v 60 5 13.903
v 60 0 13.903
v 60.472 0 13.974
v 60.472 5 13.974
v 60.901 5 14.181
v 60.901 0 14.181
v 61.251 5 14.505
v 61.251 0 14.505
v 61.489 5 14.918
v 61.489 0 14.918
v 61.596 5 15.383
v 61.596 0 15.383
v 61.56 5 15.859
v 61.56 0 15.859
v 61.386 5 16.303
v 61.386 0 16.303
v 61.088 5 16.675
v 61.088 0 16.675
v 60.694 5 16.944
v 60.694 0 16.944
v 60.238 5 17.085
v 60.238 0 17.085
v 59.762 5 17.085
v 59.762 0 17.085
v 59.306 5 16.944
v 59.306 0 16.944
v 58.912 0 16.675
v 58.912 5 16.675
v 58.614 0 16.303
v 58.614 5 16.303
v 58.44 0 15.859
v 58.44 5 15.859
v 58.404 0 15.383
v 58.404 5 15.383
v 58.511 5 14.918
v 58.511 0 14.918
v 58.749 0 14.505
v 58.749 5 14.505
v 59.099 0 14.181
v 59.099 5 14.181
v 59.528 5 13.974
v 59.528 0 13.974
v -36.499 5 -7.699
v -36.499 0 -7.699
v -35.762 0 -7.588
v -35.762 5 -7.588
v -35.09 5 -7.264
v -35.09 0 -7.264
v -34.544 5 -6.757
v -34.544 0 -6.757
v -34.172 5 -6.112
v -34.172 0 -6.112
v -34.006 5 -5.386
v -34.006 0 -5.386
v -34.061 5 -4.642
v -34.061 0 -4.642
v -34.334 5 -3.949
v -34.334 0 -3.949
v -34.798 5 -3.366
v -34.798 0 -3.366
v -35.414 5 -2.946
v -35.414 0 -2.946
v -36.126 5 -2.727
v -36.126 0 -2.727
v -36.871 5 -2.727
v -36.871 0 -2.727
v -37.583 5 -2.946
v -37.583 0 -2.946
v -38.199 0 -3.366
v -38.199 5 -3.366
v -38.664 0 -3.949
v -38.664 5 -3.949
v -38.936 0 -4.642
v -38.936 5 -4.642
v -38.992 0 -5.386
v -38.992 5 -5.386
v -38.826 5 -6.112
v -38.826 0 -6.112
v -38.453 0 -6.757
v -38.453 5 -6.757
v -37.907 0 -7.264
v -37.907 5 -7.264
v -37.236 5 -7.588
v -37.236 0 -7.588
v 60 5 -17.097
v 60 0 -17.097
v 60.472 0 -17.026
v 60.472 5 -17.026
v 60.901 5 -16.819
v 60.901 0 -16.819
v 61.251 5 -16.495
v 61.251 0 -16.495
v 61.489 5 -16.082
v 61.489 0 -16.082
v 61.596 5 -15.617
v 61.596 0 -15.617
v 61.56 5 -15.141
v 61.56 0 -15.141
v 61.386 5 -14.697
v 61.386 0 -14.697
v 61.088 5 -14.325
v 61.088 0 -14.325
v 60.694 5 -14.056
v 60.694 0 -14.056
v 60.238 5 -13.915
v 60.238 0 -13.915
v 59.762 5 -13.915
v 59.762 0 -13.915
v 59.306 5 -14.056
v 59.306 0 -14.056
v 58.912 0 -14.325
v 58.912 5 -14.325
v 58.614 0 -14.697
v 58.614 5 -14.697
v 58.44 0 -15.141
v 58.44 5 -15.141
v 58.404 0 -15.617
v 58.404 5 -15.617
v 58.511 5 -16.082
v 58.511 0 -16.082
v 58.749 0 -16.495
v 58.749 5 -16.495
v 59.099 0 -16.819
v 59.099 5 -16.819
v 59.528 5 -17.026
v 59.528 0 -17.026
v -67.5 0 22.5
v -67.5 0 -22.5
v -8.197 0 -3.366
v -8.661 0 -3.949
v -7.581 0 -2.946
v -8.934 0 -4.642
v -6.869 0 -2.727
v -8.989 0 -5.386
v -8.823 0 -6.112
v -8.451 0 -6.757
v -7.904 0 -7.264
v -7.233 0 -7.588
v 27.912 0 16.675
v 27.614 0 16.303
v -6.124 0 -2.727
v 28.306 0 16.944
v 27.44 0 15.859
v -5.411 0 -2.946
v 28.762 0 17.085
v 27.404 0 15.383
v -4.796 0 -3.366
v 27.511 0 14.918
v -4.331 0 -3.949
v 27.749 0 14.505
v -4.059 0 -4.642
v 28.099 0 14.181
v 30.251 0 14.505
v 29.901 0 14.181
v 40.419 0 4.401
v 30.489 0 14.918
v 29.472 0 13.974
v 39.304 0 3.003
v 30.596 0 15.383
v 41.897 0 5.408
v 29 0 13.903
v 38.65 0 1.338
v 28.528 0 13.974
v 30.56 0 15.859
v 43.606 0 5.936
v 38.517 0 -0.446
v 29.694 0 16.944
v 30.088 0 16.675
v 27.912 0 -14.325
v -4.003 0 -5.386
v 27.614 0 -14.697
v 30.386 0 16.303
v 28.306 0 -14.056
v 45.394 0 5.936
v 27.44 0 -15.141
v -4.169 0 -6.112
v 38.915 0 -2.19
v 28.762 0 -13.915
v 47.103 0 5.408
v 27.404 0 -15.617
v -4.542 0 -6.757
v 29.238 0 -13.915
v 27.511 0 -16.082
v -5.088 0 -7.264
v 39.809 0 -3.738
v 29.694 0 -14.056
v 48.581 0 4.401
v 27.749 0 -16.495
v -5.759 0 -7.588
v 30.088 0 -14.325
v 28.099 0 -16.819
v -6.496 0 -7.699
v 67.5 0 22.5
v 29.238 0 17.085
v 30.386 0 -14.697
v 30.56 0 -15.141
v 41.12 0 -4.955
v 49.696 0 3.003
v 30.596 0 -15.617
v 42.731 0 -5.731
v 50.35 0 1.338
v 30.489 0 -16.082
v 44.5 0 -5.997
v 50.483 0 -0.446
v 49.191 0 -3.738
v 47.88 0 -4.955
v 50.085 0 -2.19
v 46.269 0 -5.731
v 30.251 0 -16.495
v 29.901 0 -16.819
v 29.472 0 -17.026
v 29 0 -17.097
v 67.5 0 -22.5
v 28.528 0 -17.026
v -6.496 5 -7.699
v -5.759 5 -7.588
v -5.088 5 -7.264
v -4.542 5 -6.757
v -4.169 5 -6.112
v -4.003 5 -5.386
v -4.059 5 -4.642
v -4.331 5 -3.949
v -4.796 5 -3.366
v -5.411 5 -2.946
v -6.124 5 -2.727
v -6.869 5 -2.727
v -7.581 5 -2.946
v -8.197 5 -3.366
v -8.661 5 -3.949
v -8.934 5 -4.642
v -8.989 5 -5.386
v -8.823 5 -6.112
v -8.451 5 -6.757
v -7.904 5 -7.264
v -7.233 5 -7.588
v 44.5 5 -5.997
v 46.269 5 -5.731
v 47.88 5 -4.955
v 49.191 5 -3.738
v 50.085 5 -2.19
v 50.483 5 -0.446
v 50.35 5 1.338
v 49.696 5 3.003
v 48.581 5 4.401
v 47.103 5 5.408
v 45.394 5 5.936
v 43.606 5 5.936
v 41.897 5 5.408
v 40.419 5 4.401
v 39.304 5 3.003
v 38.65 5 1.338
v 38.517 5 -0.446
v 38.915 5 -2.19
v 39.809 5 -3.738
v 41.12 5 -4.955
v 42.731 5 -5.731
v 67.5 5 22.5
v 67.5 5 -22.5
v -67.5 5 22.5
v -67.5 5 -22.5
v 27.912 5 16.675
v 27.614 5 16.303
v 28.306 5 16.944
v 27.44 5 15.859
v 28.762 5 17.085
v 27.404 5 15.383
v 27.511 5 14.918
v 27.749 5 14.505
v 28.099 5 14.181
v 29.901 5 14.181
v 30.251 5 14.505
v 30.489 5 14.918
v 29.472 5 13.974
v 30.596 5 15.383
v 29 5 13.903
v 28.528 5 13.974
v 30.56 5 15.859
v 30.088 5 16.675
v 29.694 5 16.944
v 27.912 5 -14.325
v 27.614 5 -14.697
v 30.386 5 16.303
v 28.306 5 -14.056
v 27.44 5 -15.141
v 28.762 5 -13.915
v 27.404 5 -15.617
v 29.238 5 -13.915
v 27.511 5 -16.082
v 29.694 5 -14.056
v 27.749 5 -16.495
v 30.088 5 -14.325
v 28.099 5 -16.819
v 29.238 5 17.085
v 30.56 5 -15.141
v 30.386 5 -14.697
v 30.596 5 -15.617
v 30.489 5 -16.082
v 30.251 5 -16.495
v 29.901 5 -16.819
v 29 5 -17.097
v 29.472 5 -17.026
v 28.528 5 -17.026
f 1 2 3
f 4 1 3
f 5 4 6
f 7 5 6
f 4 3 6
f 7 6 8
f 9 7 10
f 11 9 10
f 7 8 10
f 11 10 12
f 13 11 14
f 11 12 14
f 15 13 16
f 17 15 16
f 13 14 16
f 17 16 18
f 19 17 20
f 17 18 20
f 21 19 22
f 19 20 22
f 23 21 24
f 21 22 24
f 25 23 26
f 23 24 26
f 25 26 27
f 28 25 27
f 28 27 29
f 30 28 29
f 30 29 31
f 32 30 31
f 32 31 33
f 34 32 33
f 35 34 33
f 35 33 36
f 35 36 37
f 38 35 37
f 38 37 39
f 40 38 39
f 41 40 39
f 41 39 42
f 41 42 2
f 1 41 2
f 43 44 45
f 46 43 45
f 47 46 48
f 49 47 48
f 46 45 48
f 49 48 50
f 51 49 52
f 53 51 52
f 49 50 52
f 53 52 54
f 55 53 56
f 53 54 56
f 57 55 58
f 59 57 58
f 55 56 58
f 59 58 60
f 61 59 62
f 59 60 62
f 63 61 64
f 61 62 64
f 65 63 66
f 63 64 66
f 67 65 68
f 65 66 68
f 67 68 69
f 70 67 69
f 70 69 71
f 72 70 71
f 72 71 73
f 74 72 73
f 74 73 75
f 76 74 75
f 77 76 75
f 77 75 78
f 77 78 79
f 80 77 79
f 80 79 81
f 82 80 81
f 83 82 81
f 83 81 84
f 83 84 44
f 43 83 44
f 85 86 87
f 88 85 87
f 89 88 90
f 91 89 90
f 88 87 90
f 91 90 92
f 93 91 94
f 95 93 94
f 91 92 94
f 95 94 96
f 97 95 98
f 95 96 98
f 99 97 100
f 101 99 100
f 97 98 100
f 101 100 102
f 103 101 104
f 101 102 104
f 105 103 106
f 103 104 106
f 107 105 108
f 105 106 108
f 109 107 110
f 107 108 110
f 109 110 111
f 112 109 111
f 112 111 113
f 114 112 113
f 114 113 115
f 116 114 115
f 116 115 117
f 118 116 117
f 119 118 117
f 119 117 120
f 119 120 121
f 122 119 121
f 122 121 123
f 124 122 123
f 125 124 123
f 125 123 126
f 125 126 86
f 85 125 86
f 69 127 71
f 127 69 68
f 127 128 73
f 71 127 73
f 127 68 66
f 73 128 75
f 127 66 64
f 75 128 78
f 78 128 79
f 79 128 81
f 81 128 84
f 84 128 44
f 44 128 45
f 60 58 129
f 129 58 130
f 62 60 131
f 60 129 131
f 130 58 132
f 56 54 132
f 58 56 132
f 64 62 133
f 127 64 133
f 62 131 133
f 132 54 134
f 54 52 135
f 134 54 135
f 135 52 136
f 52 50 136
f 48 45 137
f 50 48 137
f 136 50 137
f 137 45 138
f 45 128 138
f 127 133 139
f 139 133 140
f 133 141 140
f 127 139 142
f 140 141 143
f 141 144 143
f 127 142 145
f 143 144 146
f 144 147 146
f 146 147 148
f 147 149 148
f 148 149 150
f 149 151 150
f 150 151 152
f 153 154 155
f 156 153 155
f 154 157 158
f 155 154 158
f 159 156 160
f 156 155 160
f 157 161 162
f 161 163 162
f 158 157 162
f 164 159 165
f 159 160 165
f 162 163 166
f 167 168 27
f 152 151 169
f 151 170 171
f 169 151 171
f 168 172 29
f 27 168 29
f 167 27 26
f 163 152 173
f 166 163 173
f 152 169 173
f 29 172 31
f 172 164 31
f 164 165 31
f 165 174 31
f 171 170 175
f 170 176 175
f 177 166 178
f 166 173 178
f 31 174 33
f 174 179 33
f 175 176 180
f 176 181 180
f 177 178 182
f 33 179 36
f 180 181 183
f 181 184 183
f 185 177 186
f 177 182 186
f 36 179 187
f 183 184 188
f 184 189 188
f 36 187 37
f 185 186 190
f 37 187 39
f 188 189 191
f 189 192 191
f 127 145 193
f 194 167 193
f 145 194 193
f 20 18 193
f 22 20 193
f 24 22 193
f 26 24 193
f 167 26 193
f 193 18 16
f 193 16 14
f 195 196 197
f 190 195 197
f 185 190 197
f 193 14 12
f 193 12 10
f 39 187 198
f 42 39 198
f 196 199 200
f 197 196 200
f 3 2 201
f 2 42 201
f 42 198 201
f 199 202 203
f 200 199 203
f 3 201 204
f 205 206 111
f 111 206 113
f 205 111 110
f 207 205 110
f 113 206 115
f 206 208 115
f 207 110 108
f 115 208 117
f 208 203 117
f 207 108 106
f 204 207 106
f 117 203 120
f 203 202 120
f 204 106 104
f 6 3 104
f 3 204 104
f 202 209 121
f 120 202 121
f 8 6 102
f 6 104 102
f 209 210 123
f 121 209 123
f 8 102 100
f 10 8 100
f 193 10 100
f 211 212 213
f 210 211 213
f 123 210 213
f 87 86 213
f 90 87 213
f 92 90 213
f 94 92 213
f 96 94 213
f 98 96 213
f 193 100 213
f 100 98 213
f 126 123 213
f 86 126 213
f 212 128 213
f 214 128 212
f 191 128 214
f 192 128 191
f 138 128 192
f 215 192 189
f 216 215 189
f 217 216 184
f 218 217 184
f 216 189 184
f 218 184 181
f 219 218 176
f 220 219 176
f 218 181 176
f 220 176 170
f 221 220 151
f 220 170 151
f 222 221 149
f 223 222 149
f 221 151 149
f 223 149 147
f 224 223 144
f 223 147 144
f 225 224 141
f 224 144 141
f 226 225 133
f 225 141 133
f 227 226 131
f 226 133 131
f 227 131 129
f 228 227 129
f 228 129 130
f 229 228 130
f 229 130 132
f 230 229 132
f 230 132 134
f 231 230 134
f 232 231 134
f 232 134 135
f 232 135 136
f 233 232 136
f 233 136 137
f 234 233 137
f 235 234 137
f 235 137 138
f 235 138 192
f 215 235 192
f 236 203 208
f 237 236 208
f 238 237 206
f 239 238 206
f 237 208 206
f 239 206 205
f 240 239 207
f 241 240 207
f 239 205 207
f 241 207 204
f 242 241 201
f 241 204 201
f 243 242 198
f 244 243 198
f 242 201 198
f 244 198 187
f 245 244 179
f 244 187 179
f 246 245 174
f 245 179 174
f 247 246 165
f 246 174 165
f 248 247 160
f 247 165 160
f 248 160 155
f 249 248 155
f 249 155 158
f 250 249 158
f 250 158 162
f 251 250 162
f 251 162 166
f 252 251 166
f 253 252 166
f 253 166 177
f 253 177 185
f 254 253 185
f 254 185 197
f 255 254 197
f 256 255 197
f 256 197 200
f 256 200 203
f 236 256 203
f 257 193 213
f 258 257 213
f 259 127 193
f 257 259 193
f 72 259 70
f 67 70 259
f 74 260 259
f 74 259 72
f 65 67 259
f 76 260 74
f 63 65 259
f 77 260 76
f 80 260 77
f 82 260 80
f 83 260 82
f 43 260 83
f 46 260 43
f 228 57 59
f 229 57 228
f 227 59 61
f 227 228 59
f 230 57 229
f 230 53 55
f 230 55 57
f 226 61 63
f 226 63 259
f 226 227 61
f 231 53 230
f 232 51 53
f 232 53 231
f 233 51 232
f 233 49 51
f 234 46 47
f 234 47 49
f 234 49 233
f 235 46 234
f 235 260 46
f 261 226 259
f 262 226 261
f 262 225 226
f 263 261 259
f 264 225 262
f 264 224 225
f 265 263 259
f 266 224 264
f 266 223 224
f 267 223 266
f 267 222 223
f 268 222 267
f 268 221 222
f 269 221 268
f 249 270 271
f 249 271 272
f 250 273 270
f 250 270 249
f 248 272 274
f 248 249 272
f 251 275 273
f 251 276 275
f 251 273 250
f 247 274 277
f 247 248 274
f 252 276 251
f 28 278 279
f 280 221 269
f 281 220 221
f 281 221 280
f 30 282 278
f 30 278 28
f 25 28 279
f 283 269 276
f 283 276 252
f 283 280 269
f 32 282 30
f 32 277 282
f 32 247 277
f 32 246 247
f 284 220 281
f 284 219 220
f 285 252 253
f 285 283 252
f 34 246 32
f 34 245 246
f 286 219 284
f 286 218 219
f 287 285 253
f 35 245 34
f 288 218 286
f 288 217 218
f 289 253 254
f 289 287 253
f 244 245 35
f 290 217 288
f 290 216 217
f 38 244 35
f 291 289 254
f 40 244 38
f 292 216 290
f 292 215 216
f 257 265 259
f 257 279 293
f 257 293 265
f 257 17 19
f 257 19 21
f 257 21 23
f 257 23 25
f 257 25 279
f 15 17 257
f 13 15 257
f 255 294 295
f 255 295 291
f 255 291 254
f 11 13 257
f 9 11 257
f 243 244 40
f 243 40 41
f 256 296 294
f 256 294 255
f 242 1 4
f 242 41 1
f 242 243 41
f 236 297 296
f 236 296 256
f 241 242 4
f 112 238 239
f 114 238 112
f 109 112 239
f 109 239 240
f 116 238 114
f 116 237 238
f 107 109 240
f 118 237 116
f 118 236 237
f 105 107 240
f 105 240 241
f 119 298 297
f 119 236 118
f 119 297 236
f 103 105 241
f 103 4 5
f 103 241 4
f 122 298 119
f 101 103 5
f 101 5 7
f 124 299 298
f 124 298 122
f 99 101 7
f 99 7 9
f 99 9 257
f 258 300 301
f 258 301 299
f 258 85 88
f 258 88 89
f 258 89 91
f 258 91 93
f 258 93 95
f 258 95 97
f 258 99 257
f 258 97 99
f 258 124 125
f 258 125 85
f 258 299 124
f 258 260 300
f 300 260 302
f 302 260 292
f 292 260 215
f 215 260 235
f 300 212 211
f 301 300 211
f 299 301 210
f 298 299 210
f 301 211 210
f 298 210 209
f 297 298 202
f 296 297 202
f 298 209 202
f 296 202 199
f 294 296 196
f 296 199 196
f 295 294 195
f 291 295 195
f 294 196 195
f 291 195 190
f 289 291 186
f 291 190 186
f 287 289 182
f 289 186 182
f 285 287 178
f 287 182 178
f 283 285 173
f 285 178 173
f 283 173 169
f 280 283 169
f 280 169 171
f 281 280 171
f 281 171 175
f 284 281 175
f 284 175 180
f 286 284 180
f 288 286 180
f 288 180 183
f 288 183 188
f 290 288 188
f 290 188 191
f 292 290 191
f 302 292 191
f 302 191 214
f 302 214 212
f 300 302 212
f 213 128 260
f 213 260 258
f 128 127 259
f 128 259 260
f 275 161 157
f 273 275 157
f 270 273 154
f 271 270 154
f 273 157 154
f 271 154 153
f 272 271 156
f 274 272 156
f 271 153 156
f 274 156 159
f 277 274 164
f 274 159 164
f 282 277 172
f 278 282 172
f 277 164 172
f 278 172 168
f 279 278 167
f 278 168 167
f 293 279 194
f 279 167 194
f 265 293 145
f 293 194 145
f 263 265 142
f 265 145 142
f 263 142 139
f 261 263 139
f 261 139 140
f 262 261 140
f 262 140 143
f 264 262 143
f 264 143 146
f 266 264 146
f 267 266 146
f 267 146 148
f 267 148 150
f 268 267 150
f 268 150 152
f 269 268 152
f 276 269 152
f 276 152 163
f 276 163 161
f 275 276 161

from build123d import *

# Parameters (mm, degrees)
SKETCH1_W           = 135
SKETCH1_H           = 45
BOSS_EXTRUDE1_DEPTH = 5
CUT_EXTRUDE2_REACH  = 73.327
SKETCH3_R           = 2.5
SKETCH4_R           = 6
SKETCH4_R_2         = 1.6
CUT_EXTRUDE3_DEPTH  = 72.326713088


with BuildPart() as part:
    # Sketch1 → Boss-Extrude1 (new body)
    with BuildSketch(Plane(origin=(0, 0, 0), x_dir=(1, 0, 0), z_dir=(0, 1, 0))):
        Rectangle(SKETCH1_W, SKETCH1_H)
    extrude(amount=BOSS_EXTRUDE1_DEPTH)

    # Sketch3 → Cut-Extrude2 (cut, up to next)
    with BuildSketch(Plane.XZ, mode=Mode.PRIVATE) as cut_extrude2_sk1:
        with Locations(Location((-36.498729637, -5.198729637, 0), (0, 0, 270))):
            Circle(SKETCH3_R)
    cut_extrude2_tool1 = extrude(cut_extrude2_sk1.sketch, amount=-CUT_EXTRUDE2_REACH, mode=Mode.PRIVATE) & part.part
    # Sketch3 → Cut-Extrude2 (cut, up to next)
    with BuildSketch(Plane.XZ, mode=Mode.PRIVATE) as cut_extrude2_sk2:
        with Locations(Location((-6.496188911, -5.198729637, 0), (0, 0, 270))):
            Circle(SKETCH3_R)
    cut_extrude2_tool2 = extrude(cut_extrude2_sk2.sketch, amount=-CUT_EXTRUDE2_REACH, mode=Mode.PRIVATE) & part.part
    add(cut_extrude2_tool1.solids().sort_by_distance((-36.49873, 0, -5.19873))[0], mode=Mode.SUBTRACT)
    add(cut_extrude2_tool2.solids().sort_by_distance((-6.496189, 0, -5.19873))[0], mode=Mode.SUBTRACT)

    # Sketch4 → Cut-Extrude3 (cut, through all)
    with BuildSketch(Plane.XZ):
        with Locations(Location((44.5, 0.002540726, 0), (0, 0, 270))):
            Circle(SKETCH4_R)
        with Locations(Location((60, 15.502540726, 0), (0, 0, 270))):
            Circle(SKETCH4_R_2)
        with Locations(Location((29, 15.502540726, 0), (0, 0, 270))):
            Circle(SKETCH4_R_2)
        with Locations(Location((29, -15.497459274, 0), (0, 0, 270))):
            Circle(SKETCH4_R_2)
        with Locations(Location((60, -15.497459274, 0), (0, 0, 270))):
            Circle(SKETCH4_R_2)
    extrude(amount=-CUT_EXTRUDE3_DEPTH, mode=Mode.SUBTRACT)


solid = part.part
